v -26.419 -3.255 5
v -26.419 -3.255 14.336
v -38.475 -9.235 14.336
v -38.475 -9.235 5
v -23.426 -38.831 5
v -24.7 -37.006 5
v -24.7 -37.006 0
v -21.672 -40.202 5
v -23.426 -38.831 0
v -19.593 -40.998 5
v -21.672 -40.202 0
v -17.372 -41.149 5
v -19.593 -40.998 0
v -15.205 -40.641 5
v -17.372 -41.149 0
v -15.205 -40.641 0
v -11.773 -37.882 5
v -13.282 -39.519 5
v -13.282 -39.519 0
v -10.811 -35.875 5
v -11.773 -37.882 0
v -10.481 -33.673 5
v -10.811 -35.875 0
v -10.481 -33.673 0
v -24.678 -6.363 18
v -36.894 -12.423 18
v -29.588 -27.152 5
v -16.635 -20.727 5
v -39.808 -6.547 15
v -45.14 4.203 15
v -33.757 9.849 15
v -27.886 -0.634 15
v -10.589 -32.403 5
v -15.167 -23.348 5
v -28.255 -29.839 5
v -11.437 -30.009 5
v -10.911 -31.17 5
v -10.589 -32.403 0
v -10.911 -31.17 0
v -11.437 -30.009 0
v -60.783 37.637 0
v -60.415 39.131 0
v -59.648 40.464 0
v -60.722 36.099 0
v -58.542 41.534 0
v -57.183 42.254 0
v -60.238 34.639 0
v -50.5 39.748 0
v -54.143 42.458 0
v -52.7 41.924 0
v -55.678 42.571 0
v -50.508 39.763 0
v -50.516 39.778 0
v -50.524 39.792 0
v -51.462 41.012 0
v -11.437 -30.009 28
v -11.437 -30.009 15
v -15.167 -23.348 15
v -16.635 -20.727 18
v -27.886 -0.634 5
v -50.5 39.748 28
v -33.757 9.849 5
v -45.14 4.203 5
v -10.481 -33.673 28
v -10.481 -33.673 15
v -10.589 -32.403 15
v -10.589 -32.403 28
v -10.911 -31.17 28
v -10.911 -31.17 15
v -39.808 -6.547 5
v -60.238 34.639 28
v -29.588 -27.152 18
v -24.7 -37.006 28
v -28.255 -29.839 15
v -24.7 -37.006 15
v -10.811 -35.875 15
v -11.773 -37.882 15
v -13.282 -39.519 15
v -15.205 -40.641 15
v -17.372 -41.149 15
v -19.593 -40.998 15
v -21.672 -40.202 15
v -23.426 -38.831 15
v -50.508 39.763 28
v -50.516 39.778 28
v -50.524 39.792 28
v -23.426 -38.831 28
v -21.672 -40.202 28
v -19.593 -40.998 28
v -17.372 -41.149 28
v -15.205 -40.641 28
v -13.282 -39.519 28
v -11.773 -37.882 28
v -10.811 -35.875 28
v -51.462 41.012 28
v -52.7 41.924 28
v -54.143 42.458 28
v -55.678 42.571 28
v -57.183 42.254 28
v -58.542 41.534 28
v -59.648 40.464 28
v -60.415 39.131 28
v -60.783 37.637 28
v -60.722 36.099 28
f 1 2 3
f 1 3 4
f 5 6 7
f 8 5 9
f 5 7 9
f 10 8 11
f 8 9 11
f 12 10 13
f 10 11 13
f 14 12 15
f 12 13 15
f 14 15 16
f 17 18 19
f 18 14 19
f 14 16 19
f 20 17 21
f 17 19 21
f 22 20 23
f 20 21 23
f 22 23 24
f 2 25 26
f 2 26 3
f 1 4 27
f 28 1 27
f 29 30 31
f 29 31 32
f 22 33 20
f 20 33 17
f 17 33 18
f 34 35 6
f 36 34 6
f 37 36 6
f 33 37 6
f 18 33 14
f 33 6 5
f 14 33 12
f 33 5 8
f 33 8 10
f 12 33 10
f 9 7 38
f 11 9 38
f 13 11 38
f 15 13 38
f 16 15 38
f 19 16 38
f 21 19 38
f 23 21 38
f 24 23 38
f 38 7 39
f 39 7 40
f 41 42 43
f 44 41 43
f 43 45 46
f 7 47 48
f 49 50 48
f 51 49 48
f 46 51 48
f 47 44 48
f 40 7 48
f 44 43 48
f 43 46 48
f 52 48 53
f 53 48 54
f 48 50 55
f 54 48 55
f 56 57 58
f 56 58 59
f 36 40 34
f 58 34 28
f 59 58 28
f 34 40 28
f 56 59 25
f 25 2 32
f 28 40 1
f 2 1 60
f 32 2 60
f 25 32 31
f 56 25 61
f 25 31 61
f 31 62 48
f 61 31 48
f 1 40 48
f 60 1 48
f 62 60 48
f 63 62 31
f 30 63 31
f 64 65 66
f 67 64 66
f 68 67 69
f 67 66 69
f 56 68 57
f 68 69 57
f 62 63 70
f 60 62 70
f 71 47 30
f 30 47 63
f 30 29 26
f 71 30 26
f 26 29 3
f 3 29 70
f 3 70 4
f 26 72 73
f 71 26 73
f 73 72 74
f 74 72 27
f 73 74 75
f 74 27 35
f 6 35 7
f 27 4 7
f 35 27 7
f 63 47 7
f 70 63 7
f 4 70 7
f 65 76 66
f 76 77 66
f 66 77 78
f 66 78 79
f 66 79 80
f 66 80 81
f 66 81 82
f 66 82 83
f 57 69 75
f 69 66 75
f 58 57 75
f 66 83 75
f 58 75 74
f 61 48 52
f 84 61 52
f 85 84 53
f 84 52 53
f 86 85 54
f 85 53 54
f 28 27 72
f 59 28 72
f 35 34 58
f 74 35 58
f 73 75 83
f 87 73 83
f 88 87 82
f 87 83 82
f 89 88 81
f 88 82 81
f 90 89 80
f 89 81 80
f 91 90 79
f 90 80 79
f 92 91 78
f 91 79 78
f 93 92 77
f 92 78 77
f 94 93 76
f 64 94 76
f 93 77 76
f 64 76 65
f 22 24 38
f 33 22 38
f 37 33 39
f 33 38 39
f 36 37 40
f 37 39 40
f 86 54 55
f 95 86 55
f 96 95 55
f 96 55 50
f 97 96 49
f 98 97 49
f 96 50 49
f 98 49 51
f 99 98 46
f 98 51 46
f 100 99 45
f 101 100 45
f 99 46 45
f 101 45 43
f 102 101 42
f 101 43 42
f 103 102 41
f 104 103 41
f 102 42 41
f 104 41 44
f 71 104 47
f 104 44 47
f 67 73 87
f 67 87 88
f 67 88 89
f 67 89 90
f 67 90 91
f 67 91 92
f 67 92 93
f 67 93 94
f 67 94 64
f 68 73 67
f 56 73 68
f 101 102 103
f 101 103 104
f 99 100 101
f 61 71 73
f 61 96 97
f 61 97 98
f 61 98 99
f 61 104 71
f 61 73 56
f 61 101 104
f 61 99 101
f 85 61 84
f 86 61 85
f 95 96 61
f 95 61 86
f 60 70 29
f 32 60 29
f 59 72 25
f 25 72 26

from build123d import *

# Parameters (mm, degrees)
F1_DEPTH = 28
F2_W     = 8
F2_H     = 10
F2_W_2   = 12.2721928373
F3_DEPTH = 25
F5_DEPTH = 25
F6_W     = 12
F6_H     = 10
F7_DEPTH = 25


with BuildPart() as f1:
    # F0 (on Top) → F1 (new body)
    with BuildSketch(Plane.XY):
        with BuildLine():
            ThreePointArc((-24.6996765713, -37.0061686144), (-16.2693027335, -40.9755360174), (-10.4808306919, -33.6734354945))
            ThreePointArc((-10.4808306919, -33.6734354945), (-10.7238019768, -31.7798848011), (-11.4369731527, -30.0090216931))
            Line((-11.4369731527, -30.0090216931), (-18.068324862, -33.5075951538))
            Line((-18.068324862, -33.5075951538), (-24.6996765713, -37.0061686144))
        make_face()
        with BuildLine():
            Line((-11.4369731527, -30.0090216931), (-50.5240537004, 39.792125391))
            ThreePointArc((-50.5240537004, 39.792125391), (-49.9919649413, 38.4837967792), (-49.81061565, 37.083098868))
            ThreePointArc((-49.81061565, 37.083098868), (-50.6007682567, 34.242792981), (-52.7441929341, 32.2185871305))
            Line((-52.7441929341, 32.2185871305), (-21.4804980317, -27.040010398))
            ThreePointArc((-21.4804980317, -27.040010398), (-15.8546767675, -26.4811153201), (-11.4369731527, -30.0090216931))
        make_face()
        with BuildLine():
            Line((-18.068324862, -33.5075951538), (-11.4369731527, -30.0090216931))
            ThreePointArc((-11.4369731527, -30.0090216931), (-15.8546767675, -26.4811153201), (-21.4804980317, -27.040010398))
            Line((-21.4804980317, -27.040010398), (-18.068324862, -33.5075951538))
        make_face()
        with BuildLine():
            Line((-60.2377675578, 34.639091078), (-24.6996765713, -37.0061686144))
            ThreePointArc((-24.6996765713, -37.0061686144), (-25.1177474282, -31.3681330201), (-21.4804980317, -27.040010398))
            Line((-21.4804980317, -27.040010398), (-52.7441929341, 32.2185871305))
            ThreePointArc((-52.7441929341, 32.2185871305), (-57.0011689379, 31.8493593272), (-60.2377675578, 34.639091078))
        make_face()
        with BuildLine():
            ThreePointArc((-21.4804980317, -27.040010398), (-25.1177474282, -31.3681330201), (-24.6996765713, -37.0061686144))
            Line((-24.6996765713, -37.0061686144), (-18.068324862, -33.5075951538))
            Line((-18.068324862, -33.5075951538), (-21.4804980317, -27.040010398))
        make_face()
        with BuildLine():
            ThreePointArc((-49.81061565, 37.083098868), (-49.9919649413, 38.4837967792), (-50.5240537004, 39.792125391))
            ThreePointArc((-50.5240537004, 39.792125391), (-57.8880915552, 41.9417630834), (-60.2377675578, 34.639091078))
            ThreePointArc((-60.2377675578, 34.639091078), (-57.0011689379, 31.8493593272), (-52.7441929341, 32.2185871305))
            ThreePointArc((-52.7441929341, 32.2185871305), (-50.6007682567, 34.242792981), (-49.81061565, 37.083098868))
        make_face()
    extrude(amount=F1_DEPTH)

    # F2 (on face) → F3 (cut)
    with BuildSketch(Plane(origin=(-34.5539816123, -17.1397598076, 0), x_dir=(0.4443650527, -0.8958458014, 0), z_dir=(-0.8958458014, -0.4443650527, 0))):
        with Locations((18.1761476979, 10)):
            Rectangle(F2_W, F2_H)
        with Locations((28.3122441165, 10)):
            Rectangle(F2_W_2, F2_H)
    extrude(amount=-F3_DEPTH, mode=Mode.SUBTRACT)

    # F4 (on face) → F5 (cut)
    with BuildSketch(Plane(origin=(-34.5539816123, -17.1397598076, 0), x_dir=(0.4443650527, -0.8958458014, 0), z_dir=(-0.8958458014, -0.4443650527, 0))):
        Polygon((-8.8238523021, 5), (11.1761476979, 5), (11.1761476979, 18), (-5.2653332241, 18), (-8.8238523021, 14.3358809873), align=None)
    extrude(amount=-F5_DEPTH, mode=Mode.SUBTRACT)

    # F6 (on face) → F7 (cut)
    with BuildSketch(Plane(origin=(-34.5539816123, -17.1397598076, 0), x_dir=(0.4443650527, -0.8958458014, 0), z_dir=(-0.8958458014, -0.4443650527, 0))):
        with Locations((-17.8238523021, 10)):
            Rectangle(F6_W, F6_H)
    extrude(amount=-F7_DEPTH, mode=Mode.SUBTRACT)


solid = f1.part
